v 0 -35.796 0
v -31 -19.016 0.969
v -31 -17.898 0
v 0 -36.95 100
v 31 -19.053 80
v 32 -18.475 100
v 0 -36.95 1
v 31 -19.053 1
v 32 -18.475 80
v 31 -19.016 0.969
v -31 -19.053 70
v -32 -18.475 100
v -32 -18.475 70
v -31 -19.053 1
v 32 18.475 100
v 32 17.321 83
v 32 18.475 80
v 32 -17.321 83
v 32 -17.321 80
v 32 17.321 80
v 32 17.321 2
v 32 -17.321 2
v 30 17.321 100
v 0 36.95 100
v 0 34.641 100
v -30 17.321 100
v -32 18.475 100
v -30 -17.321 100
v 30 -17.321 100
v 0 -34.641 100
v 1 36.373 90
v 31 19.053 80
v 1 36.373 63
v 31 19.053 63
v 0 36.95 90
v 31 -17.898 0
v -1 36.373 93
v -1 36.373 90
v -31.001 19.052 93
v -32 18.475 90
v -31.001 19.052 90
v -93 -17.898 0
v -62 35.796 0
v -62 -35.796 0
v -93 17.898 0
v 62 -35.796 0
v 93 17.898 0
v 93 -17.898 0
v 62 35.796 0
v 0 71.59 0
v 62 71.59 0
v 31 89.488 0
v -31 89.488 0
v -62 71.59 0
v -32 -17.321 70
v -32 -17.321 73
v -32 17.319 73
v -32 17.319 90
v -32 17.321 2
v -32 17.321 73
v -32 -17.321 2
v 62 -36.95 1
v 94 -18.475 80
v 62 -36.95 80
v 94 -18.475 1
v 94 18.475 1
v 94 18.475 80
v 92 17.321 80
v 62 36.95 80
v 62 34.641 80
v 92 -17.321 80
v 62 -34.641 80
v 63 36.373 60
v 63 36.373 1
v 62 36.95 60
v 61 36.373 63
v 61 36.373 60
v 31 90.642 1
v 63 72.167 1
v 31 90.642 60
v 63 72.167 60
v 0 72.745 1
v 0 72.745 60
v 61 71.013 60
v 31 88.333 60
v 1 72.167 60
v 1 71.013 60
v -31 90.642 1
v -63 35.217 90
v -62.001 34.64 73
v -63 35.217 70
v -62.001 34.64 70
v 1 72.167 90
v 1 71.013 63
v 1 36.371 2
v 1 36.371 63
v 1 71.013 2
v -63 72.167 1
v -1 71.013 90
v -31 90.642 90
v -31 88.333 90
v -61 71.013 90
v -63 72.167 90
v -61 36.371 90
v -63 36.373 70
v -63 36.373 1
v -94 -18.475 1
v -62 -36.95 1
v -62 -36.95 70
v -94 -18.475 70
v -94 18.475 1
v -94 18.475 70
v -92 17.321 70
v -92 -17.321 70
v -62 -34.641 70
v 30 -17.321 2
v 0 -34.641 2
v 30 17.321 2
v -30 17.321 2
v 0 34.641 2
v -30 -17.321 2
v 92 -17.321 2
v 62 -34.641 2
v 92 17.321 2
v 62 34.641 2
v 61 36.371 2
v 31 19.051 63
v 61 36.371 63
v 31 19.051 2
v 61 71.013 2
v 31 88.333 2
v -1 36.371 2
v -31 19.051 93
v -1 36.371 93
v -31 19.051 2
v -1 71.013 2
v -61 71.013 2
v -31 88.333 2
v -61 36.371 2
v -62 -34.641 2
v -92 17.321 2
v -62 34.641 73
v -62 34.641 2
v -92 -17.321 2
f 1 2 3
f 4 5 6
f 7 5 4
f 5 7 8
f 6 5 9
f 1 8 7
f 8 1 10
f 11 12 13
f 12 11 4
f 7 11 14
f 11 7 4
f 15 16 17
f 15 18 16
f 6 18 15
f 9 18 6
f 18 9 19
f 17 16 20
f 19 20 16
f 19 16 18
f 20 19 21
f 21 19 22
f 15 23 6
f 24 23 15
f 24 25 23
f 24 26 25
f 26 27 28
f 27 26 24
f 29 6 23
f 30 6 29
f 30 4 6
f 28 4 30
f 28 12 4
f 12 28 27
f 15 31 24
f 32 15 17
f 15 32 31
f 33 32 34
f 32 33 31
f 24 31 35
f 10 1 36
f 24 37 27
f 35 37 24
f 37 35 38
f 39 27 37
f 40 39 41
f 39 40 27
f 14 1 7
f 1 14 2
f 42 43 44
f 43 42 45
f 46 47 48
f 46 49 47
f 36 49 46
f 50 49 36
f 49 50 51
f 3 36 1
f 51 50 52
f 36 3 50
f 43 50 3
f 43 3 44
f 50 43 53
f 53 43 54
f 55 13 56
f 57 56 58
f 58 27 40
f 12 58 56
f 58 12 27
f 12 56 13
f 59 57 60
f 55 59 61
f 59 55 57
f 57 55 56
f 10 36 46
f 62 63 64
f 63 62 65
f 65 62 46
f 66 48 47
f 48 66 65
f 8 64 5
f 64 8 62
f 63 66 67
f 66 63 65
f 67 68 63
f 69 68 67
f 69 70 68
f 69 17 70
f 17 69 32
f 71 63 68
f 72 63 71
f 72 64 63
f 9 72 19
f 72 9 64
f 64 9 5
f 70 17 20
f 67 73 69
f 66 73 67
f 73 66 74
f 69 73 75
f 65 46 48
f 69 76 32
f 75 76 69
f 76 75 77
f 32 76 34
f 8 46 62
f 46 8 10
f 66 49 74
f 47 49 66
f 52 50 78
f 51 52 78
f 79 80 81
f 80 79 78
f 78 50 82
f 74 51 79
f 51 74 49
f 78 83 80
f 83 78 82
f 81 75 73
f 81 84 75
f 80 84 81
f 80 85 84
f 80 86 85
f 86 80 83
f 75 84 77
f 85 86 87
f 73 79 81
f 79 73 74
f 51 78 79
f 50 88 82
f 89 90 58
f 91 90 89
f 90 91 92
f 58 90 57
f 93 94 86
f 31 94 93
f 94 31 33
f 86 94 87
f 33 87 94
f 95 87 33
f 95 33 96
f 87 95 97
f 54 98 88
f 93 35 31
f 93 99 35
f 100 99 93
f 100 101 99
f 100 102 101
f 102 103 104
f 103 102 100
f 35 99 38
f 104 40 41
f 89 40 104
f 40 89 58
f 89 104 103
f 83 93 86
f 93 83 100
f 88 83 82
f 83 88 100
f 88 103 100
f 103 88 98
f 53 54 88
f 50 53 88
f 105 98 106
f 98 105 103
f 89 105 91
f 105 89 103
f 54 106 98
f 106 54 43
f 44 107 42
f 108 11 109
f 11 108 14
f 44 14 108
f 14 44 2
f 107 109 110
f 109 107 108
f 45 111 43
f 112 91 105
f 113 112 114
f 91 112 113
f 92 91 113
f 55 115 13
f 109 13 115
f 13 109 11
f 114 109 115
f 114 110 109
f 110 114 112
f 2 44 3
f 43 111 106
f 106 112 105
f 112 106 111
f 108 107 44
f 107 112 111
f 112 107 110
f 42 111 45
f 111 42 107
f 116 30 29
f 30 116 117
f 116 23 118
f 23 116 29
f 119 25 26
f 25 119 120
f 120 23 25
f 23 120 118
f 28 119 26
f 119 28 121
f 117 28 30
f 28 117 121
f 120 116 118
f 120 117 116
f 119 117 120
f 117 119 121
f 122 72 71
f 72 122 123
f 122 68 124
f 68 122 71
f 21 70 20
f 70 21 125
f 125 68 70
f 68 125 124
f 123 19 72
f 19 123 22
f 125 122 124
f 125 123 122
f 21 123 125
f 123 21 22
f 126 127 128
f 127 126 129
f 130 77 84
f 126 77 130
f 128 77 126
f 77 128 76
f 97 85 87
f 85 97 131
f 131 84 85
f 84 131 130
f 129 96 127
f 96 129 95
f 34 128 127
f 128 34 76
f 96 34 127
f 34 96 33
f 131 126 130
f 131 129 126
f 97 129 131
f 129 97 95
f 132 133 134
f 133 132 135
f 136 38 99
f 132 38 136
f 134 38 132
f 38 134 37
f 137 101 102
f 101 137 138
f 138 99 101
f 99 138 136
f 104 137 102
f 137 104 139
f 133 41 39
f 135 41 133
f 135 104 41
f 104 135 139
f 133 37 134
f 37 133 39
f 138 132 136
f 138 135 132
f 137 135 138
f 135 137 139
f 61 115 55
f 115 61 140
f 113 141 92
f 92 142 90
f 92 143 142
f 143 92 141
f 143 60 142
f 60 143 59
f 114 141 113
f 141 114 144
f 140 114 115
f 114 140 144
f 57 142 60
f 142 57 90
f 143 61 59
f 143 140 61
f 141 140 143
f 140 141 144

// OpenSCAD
// Modular Hex Desk Organizer - original parametric design
// Author: Brian Sacco. License: see listing.
// Each cell is a hexagonal cup; cups sit side by side in a honeycomb cluster.

cells       = 5;      // 1..7 cells in a honeycomb cluster
cell_flat   = 60;     // flat-to-flat inner width of each cell (mm)
wall        = 2.0;    // wall thickness (mm)
base        = 2.0;    // floor thickness (mm)
heights     = [100, 80, 60, 90, 70, 110, 50]; // height of each cell (mm)
chamfer     = 1.0;    // bottom edge chamfer to avoid elephant foot
$fn = 6;

// axial offsets for a 7-cell honeycomb (center + ring)
function pitch() = cell_flat + wall;
offsets = [[0,0],[1,0],[0.5,0.866],[-0.5,0.866],[-1,0],[-0.5,-0.866],[0.5,-0.866]];

module hex(flat, h) {
    // cylinder with $fn=6 is measured corner-to-corner; convert flat->corner
    cylinder(d = flat / cos(30), h = h, $fn = 6);
}

module outer(h) {
    hull() {
        hex(cell_flat + 2*wall - 2*chamfer, h);
        translate([0,0,chamfer]) hex(cell_flat + 2*wall, h - chamfer);
    }
}

// Union every outer shell first, then carve every cavity: shared walls stay manifold.
n = min(cells, 7);
difference() {
    union() for (i = [0 : n-1])
        translate([offsets[i][0]*pitch(), offsets[i][1]*pitch(), 0]) rotate([0,0,30]) outer(heights[i]);
    for (i = [0 : n-1])
        translate([offsets[i][0]*pitch(), offsets[i][1]*pitch(), base]) rotate([0,0,30]) hex(cell_flat, heights[i] + 1);
}
